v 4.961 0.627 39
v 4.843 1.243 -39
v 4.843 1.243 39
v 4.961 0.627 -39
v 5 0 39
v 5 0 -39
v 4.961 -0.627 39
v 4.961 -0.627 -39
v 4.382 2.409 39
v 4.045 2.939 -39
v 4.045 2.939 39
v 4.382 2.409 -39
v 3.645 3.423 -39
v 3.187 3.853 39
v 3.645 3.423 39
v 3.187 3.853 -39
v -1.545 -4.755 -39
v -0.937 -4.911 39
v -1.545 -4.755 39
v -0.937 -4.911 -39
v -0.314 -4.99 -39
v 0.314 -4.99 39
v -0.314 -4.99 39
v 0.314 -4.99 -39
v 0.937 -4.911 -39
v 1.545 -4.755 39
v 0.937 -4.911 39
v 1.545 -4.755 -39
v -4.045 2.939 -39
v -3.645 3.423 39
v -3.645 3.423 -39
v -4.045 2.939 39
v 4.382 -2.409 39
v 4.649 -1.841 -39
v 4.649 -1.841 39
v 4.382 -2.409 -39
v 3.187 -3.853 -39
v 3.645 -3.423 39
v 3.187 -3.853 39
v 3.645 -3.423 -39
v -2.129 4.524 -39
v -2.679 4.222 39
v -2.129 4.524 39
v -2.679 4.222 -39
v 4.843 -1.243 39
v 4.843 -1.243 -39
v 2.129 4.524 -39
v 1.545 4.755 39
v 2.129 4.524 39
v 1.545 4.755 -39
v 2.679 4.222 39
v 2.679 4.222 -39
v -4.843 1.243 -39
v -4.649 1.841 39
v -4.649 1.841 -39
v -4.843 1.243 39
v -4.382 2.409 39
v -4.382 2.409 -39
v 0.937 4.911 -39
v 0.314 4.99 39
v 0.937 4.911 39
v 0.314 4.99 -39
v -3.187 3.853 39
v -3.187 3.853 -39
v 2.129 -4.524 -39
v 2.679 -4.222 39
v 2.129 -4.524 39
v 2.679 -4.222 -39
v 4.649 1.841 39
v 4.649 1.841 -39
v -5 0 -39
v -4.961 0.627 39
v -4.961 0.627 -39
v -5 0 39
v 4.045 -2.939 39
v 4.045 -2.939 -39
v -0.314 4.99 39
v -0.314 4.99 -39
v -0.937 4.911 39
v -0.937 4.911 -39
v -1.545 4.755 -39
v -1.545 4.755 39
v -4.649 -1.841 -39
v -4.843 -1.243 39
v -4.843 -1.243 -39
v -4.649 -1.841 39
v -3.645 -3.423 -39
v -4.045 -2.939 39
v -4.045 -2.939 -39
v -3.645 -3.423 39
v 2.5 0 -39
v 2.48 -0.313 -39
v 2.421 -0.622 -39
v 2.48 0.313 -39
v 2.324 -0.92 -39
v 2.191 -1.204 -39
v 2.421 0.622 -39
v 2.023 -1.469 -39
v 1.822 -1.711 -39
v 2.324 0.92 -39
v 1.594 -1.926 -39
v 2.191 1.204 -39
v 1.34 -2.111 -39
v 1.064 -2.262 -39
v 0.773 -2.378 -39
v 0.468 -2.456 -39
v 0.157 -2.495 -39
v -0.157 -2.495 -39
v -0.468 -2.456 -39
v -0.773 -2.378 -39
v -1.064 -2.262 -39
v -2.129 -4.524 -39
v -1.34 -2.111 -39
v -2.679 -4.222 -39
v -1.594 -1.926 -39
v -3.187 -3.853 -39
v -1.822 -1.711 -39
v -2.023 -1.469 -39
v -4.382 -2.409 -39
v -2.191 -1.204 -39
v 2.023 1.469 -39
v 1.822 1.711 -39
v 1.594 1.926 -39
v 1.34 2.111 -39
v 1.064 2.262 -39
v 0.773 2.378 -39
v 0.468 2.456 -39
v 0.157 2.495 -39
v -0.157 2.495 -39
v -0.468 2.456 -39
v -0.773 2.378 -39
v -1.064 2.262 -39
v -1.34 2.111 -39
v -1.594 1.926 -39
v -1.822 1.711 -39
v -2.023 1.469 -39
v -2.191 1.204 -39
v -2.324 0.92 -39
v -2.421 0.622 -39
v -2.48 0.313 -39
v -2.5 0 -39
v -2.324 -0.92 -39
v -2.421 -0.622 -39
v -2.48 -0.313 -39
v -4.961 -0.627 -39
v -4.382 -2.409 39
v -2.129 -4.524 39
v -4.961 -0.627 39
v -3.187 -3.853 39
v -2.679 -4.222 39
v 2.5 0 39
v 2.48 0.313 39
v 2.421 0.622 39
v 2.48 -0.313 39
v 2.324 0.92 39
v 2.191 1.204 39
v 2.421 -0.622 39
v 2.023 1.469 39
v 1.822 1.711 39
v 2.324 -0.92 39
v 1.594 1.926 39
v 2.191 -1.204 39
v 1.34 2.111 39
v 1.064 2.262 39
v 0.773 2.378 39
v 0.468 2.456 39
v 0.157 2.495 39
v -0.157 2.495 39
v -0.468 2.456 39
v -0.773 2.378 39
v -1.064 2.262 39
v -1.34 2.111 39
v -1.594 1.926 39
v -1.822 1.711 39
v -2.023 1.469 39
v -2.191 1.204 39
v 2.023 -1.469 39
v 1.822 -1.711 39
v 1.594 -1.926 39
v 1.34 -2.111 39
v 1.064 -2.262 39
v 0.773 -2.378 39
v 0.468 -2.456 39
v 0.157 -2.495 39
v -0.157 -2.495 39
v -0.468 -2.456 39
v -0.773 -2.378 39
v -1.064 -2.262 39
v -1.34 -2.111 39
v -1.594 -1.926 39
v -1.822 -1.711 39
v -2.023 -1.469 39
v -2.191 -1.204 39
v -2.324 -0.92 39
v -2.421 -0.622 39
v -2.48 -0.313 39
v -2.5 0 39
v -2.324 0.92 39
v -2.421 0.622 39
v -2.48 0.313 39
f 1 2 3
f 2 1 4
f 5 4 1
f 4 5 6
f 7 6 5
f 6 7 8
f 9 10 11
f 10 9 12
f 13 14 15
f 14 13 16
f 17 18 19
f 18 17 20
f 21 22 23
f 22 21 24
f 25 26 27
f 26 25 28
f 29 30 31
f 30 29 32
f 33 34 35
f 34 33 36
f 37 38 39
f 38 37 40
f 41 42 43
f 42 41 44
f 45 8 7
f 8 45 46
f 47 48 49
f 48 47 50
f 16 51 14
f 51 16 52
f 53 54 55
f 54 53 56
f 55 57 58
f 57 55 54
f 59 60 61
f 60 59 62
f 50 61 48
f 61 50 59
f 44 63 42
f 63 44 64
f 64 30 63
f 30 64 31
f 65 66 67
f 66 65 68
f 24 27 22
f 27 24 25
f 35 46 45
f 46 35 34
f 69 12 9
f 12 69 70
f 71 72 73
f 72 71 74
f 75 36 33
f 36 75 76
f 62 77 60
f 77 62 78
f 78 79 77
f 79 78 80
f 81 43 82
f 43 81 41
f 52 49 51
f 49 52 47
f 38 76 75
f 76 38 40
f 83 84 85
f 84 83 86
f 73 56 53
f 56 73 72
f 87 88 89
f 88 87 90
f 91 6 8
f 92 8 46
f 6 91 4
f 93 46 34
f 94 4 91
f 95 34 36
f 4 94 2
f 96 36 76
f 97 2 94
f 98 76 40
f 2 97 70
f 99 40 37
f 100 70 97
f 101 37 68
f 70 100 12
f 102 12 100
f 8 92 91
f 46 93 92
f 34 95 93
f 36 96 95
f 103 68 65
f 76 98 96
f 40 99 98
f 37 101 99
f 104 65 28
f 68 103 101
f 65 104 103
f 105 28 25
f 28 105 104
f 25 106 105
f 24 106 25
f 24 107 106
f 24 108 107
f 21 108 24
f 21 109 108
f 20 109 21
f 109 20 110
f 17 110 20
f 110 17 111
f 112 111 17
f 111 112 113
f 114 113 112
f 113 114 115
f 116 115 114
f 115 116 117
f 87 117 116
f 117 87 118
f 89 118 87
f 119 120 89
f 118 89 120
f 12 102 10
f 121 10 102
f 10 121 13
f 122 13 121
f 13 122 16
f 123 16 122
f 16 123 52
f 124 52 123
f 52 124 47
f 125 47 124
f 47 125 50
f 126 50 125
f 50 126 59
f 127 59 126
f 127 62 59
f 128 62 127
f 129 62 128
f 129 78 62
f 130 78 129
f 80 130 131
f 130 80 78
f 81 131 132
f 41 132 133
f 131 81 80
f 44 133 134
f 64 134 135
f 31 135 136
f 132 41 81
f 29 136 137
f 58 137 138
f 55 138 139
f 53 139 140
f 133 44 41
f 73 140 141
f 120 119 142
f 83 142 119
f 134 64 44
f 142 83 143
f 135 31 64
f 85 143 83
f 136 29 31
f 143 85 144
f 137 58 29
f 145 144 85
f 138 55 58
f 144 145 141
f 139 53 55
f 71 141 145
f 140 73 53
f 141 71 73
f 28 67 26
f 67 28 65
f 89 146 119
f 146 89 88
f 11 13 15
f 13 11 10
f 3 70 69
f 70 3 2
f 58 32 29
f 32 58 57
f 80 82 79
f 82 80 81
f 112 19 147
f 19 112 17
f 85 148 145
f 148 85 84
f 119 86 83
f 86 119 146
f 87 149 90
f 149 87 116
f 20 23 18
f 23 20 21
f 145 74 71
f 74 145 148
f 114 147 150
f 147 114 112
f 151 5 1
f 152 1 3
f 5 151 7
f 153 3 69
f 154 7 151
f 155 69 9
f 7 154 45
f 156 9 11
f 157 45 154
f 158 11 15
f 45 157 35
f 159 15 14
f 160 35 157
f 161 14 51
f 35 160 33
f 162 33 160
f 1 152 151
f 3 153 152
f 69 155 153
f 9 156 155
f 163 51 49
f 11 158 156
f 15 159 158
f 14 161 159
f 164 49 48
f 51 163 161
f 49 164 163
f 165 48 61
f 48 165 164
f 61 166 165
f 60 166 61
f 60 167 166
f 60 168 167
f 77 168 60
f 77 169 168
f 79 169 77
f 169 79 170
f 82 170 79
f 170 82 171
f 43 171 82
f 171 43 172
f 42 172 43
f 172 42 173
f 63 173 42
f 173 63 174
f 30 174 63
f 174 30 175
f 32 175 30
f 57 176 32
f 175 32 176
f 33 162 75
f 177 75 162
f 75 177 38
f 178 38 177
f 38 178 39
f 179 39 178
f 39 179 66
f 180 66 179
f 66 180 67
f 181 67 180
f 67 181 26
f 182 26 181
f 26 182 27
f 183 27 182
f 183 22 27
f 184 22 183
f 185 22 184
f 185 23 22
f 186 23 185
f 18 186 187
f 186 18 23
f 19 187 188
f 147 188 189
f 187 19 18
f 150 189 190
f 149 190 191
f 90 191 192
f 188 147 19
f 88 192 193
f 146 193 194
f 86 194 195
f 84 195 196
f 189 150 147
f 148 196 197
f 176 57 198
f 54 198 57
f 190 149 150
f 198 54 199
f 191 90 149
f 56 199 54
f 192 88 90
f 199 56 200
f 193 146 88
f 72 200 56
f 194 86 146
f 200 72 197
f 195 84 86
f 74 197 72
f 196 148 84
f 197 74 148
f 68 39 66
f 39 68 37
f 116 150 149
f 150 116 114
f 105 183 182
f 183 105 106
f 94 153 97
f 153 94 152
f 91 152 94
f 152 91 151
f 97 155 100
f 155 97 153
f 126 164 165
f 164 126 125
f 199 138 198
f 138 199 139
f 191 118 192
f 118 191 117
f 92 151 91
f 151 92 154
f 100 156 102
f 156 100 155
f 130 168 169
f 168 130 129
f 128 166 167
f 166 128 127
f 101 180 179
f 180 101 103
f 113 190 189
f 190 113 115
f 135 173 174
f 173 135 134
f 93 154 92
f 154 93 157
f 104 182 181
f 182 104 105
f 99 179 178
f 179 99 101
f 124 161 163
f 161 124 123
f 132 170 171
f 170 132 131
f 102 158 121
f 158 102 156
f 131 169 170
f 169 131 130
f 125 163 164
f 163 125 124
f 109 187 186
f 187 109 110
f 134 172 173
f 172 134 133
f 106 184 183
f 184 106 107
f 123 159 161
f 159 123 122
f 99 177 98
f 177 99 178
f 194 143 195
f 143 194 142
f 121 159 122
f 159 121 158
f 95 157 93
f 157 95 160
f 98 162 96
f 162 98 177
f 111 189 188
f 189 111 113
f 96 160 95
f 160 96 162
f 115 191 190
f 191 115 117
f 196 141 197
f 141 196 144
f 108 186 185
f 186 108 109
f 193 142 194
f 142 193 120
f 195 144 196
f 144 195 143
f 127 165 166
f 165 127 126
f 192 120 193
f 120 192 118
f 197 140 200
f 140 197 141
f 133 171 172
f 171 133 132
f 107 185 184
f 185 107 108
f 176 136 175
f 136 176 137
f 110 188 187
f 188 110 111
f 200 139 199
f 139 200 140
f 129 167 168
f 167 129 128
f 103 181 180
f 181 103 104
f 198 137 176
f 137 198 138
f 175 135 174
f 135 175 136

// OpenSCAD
$fn = 50;


difference() {
	union() {
		translate(v = [0, 0, -39.0000000000]) {
			cylinder(h = 78, r = 5.0000000000);
		}
	}
	union() {
		translate(v = [0, 0, -100.0000000000]) {
			cylinder(h = 200, r = 2.5000000000);
		}
	}
}
